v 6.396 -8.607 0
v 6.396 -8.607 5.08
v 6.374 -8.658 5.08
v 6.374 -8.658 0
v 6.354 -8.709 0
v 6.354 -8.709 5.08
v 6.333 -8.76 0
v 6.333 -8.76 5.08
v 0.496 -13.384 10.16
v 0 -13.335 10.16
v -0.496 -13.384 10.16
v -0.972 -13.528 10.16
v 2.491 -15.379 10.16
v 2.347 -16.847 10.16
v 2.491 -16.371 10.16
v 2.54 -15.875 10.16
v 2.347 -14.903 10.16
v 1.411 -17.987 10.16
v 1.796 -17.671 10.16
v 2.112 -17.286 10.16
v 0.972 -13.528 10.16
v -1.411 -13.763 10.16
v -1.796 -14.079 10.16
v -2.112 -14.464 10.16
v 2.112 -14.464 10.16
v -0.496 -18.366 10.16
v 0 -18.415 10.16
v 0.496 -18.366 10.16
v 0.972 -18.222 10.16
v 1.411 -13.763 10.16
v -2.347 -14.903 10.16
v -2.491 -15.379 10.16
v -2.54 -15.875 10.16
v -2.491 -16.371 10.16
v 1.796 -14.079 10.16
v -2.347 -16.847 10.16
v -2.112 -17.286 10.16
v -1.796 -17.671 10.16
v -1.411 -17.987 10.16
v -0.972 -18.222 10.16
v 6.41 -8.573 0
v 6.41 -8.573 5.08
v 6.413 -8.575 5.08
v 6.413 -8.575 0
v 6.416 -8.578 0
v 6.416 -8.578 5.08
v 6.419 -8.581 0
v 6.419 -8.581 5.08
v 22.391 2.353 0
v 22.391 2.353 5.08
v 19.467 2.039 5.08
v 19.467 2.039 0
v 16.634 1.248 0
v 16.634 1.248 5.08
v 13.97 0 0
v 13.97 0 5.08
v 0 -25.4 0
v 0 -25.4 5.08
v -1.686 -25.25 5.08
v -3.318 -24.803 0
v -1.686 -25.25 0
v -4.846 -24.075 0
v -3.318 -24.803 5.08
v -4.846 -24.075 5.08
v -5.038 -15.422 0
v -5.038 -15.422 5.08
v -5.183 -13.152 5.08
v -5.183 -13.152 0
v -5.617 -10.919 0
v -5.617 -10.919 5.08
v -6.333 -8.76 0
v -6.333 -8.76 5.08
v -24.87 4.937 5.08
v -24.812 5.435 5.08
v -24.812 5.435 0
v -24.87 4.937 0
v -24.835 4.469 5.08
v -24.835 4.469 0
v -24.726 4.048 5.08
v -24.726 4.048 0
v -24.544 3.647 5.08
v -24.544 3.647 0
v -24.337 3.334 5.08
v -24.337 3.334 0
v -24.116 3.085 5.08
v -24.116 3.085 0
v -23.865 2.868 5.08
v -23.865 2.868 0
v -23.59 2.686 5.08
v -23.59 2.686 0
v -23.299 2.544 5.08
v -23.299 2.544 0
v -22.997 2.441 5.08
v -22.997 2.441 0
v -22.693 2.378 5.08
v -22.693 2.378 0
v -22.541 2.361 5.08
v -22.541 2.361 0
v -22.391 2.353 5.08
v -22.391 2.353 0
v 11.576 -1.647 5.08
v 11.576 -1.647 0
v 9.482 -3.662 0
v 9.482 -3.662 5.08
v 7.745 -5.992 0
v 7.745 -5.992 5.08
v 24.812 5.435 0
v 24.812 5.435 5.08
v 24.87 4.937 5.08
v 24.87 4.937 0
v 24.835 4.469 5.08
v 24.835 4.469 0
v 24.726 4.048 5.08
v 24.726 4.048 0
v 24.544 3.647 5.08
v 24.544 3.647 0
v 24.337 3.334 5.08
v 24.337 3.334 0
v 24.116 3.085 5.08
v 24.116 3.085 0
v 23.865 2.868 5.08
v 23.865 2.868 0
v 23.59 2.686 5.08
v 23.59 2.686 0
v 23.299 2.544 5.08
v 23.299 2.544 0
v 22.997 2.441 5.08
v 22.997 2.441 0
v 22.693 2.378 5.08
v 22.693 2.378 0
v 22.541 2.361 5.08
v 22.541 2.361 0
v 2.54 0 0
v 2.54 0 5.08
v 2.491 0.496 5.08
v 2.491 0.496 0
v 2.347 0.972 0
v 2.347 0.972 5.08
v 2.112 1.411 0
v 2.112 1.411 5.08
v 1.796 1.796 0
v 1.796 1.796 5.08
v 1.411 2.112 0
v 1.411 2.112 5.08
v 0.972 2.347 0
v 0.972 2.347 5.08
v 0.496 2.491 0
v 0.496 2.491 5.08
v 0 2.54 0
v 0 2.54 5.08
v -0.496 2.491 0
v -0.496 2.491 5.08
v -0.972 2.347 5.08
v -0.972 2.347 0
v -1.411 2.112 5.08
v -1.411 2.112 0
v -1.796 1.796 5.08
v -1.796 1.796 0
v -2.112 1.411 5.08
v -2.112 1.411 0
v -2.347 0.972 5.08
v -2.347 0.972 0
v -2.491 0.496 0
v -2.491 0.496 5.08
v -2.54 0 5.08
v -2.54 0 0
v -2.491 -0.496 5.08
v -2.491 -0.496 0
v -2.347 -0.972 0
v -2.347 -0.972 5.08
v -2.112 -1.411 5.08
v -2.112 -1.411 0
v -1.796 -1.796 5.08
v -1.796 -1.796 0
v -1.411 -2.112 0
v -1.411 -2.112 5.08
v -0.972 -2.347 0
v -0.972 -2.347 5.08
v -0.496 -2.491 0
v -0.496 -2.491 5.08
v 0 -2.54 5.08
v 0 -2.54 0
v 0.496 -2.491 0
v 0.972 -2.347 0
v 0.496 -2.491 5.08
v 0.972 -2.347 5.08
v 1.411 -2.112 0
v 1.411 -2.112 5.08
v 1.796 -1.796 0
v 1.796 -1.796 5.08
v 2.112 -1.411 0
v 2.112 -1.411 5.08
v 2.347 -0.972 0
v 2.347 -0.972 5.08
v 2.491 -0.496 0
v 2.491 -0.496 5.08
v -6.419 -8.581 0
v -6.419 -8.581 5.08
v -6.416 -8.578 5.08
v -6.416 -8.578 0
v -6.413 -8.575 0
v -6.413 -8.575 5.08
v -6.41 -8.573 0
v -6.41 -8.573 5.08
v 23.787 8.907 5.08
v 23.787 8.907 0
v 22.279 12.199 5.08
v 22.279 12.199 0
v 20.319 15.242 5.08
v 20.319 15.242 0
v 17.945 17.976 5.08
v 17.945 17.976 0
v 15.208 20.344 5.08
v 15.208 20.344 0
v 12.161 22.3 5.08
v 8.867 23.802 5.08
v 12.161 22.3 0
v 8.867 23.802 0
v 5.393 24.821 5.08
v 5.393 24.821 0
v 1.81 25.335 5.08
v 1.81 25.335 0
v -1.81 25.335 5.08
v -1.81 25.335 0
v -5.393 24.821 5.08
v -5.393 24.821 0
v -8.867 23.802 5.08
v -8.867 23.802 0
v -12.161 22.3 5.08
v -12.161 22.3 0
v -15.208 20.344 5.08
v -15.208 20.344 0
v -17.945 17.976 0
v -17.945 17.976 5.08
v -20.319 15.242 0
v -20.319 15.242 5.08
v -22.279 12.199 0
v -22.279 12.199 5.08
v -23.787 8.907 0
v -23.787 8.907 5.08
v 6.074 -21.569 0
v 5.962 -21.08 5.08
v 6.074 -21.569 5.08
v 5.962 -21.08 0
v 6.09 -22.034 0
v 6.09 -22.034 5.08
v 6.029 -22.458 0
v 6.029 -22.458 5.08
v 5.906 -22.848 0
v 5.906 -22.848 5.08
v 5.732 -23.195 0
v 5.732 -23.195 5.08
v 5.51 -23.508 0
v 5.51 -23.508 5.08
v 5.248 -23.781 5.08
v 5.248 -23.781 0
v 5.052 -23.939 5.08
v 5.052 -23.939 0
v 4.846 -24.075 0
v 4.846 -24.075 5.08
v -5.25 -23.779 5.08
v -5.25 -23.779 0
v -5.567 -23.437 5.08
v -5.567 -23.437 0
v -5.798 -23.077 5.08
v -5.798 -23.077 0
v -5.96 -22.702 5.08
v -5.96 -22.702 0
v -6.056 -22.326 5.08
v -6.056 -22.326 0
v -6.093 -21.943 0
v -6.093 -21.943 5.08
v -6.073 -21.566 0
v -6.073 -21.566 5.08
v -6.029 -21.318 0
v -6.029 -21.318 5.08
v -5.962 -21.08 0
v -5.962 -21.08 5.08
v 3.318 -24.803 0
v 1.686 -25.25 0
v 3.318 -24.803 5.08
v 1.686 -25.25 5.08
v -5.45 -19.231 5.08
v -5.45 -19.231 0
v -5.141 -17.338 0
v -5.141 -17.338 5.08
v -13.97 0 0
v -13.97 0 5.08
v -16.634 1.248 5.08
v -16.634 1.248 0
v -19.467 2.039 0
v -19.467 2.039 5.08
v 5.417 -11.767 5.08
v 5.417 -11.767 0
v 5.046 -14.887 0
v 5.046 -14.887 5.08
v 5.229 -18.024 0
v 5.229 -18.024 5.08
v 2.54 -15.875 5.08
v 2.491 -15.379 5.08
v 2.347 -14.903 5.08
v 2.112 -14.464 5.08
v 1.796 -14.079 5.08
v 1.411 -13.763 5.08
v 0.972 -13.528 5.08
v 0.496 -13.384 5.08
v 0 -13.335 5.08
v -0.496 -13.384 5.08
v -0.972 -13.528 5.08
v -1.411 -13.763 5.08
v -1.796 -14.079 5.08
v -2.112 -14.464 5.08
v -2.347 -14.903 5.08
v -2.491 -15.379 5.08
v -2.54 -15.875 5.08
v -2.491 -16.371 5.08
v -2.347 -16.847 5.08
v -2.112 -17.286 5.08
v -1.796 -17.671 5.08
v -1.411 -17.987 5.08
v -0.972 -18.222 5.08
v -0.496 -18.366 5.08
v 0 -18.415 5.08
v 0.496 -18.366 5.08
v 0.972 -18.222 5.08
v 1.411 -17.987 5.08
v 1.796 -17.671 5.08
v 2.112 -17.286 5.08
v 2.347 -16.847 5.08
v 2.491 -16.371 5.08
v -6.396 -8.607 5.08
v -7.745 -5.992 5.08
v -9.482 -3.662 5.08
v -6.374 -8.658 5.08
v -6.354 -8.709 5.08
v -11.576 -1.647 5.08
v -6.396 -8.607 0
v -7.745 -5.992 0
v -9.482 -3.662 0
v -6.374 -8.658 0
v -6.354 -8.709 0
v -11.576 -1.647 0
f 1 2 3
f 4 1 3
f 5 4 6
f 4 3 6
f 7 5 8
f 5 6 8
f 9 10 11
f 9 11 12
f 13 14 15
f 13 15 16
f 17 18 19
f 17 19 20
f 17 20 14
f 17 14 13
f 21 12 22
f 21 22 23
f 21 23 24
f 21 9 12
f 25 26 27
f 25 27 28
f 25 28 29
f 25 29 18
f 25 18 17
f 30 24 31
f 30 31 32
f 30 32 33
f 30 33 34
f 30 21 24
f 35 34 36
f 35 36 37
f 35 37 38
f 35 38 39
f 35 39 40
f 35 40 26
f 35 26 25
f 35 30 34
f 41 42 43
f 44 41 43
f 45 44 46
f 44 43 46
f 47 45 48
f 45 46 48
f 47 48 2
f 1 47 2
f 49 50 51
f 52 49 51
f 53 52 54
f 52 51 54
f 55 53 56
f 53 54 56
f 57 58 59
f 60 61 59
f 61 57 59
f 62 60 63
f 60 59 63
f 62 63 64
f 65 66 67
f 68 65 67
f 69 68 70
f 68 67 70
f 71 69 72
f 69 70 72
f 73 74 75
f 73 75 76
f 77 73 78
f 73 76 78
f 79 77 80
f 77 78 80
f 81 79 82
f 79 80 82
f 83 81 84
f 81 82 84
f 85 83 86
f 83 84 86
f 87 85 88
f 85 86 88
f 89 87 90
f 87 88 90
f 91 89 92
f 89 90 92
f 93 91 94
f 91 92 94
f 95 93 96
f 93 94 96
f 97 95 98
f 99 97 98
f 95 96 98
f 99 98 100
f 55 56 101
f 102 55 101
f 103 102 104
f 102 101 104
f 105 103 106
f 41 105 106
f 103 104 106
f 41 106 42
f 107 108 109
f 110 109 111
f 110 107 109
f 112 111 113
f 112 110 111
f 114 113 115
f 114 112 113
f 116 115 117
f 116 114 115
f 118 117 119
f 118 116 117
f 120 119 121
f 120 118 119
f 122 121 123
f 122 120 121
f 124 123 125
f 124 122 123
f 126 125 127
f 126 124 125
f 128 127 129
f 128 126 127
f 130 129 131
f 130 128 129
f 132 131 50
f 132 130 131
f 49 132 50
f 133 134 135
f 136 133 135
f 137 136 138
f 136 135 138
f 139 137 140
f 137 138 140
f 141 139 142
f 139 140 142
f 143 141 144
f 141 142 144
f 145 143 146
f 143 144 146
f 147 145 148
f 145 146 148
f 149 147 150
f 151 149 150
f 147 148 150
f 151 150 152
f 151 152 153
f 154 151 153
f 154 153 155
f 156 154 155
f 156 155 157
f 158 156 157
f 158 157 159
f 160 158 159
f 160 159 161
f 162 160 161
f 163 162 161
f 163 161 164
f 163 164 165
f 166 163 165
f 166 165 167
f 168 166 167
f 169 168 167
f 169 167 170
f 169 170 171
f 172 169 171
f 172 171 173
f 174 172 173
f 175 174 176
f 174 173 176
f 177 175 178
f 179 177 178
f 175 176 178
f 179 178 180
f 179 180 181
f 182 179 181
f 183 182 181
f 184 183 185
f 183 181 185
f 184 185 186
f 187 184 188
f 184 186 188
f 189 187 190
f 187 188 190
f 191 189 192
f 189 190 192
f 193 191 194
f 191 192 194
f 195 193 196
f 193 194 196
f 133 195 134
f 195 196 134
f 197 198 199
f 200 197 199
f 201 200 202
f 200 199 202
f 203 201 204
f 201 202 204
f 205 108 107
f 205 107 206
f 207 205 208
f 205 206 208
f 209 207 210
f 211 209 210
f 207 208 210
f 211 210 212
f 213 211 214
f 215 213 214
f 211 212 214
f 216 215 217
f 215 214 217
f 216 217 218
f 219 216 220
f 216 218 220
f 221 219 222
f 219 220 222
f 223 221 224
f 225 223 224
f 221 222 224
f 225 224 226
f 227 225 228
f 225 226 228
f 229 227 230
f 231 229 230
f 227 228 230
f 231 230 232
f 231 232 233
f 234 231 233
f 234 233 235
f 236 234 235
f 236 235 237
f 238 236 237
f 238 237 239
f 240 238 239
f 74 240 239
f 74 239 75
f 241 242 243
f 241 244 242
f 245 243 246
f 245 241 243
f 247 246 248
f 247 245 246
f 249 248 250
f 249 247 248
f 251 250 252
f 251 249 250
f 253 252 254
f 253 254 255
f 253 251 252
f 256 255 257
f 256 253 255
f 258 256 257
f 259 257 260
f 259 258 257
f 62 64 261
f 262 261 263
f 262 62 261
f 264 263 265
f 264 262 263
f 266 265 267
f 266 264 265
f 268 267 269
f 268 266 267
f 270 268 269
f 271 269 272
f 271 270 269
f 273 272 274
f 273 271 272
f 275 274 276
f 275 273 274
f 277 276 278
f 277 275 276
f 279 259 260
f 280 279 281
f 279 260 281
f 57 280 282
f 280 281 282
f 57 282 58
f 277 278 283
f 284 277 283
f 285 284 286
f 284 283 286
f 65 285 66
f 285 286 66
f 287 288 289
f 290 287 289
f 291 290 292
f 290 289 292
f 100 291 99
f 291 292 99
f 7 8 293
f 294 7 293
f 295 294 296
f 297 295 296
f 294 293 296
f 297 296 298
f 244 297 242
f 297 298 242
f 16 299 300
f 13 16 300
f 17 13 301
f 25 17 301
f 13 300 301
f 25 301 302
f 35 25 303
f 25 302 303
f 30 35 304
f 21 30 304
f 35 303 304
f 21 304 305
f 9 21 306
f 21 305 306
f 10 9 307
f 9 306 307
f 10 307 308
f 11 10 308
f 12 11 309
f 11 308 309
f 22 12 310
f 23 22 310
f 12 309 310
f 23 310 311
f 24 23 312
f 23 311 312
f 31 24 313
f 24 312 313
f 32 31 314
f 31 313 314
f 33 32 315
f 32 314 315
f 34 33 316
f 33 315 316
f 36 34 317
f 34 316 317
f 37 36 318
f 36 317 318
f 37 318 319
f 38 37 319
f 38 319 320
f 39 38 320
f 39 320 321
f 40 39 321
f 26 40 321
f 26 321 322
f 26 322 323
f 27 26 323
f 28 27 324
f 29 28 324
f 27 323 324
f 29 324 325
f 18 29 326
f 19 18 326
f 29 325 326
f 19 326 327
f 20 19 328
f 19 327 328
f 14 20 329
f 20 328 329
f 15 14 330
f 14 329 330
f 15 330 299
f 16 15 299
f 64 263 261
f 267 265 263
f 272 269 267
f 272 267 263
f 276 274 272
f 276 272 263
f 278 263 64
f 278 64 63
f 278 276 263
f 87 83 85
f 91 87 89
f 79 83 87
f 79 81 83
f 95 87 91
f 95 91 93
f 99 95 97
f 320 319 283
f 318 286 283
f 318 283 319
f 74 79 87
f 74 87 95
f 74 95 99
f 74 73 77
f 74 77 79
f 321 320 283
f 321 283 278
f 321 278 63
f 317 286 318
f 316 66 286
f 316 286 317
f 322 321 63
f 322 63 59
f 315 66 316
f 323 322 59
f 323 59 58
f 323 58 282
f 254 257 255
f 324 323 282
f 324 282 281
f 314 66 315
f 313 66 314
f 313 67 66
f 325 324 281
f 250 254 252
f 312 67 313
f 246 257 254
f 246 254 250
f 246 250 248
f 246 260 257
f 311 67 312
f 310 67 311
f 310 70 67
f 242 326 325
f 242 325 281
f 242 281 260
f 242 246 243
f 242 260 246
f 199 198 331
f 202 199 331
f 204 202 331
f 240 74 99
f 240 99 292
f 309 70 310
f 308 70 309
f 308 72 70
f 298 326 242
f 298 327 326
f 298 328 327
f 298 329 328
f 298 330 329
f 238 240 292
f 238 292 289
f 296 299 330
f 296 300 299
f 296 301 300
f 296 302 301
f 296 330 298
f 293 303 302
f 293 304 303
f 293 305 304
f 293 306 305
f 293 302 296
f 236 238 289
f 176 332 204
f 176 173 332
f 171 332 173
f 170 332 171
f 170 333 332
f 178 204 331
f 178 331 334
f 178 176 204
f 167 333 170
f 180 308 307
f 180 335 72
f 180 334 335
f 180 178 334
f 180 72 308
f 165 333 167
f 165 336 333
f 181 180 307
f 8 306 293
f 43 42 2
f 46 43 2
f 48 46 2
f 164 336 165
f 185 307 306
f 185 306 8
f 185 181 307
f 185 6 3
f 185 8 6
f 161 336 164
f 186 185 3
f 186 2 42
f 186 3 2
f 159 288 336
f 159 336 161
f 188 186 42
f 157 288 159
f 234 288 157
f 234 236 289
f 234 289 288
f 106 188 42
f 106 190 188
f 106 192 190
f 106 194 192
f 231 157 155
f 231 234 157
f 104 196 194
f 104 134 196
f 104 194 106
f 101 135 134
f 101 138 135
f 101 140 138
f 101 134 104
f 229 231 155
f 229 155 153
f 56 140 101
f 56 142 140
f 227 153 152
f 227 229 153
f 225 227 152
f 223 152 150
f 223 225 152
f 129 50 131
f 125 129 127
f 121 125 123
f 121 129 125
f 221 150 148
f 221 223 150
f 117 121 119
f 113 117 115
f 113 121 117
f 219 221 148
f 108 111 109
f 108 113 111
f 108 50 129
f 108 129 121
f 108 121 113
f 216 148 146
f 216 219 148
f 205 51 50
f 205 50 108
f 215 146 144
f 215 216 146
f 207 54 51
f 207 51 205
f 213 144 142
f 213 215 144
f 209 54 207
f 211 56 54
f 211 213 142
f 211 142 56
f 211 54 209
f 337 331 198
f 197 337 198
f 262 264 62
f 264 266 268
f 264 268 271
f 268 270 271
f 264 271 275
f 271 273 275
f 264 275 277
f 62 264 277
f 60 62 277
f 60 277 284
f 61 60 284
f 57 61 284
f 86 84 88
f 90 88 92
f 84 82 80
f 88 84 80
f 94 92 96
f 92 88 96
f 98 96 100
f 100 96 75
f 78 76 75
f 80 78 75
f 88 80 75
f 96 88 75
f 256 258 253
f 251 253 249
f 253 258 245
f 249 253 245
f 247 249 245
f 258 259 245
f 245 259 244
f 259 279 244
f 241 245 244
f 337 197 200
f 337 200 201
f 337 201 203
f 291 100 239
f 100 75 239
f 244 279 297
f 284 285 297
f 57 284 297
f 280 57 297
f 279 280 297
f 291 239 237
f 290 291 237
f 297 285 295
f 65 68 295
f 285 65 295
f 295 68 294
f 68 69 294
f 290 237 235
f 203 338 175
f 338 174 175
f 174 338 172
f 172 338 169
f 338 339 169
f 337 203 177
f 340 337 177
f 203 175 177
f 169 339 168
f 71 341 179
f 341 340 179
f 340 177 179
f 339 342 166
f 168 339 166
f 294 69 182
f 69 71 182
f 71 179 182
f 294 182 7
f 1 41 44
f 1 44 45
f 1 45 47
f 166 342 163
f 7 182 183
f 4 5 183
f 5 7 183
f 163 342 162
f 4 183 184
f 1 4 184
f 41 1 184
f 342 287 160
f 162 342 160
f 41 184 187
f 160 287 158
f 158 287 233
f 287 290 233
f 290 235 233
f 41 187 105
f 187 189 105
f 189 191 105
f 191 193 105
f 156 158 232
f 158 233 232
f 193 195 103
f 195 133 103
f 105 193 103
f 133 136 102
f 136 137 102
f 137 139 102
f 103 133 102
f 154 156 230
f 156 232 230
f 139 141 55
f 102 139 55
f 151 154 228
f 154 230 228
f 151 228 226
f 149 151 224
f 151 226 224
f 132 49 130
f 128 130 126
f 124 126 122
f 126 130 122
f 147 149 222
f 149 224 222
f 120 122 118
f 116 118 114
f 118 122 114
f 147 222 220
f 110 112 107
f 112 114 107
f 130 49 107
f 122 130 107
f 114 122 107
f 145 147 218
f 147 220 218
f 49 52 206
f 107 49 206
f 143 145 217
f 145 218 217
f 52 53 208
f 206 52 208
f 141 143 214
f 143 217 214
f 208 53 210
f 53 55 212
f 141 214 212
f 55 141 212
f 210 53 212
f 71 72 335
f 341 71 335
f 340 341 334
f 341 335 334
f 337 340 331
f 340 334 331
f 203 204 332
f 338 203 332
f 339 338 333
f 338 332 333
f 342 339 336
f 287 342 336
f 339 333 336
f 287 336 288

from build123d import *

# Parameters (mm, degrees)
F0_R     = 25.4
F1_DEPTH = 5.08
F3_DEPTH = 25.4
F4_R     = 2.54
F5_R     = 2.54
F6_DEPTH = 25.4
F8_DEPTH = 5.08


with BuildPart() as f1:
    # F0 (on Top) → F1 (new body)
    with BuildSketch(Plane.XY):
        Circle(F0_R)
    extrude(amount=F1_DEPTH)

    # F2 (on face) → F3 (cut)
    with BuildSketch(Plane.XY.offset(5.08)):
        with BuildLine():
            ThreePointArc((-6.6100981471, -22.7330046286), (-9.5231262698, -15.6860792516), (-6.3329048366, -8.7602307605))
            ThreePointArc((-6.3329048366, -8.7602307605), (-6.3640275163, -8.6837329224), (-6.3955051853, -8.6073804713))
            Line((-6.3955051853, -8.6073804713), (-6.4190231614, -8.5806554984))
            ThreePointArc((-6.4190231614, -8.5806554984), (-18.6783561202, -10.4151947963), (-25.4, -3e-09))
            ThreePointArc((-25.4, -3e-09), (-20.4128361311, -15.1154265929), (-7.4097542481, -24.295175282))
            ThreePointArc((-7.4097542481, -24.295175282), (-6.9906405345, -23.523962051), (-6.6100981471, -22.7330046286))
        make_face()
        with BuildLine():
            Line((-13.97, 0), (-6.4190231614, -8.5806554984))
            ThreePointArc((-6.4190231614, -8.5806554984), (-6.4144876205, -8.5766620945), (-6.4099541915, -8.5726662931))
            ThreePointArc((-6.4099541915, -8.5726662931), (-9.482325957, -3.6622711754), (-13.97, 0))
        make_face()
        with BuildLine():
            ThreePointArc((-25.4, -3e-09), (-18.6783561202, -10.4151947963), (-6.4190231614, -8.5806554984))
            Line((-6.4190231614, -8.5806554984), (-13.97, 0))
            ThreePointArc((-13.97, 0), (-19.3966889497, 2.0254618044), (-25.1864455812, 2.1991472264))
            ThreePointArc((-25.1864455812, 2.1991472264), (-25.3464861227, 1.1047458984), (-25.4, -3e-09))
        make_face()
        with BuildLine():
            ThreePointArc((-5.0375846352, -15.4223424331), (-5.3644186356, -12.0289080974), (-6.3329048366, -8.7602307605))
            ThreePointArc((-6.3329048366, -8.7602307605), (-9.5231262698, -15.6860792516), (-6.6100981471, -22.7330046286))
            ThreePointArc((-6.6100981471, -22.7330046286), (-5.4351580244, -19.1612787953), (-5.0375846352, -15.4223424331))
        make_face()
        with BuildLine():
            ThreePointArc((-7.4097542481, -24.295175282), (-3.7458341923, -25.1222754981), (3.3e-08, -25.4))
            ThreePointArc((3.3e-08, -25.4), (-3.3627869226, -24.7866378468), (-6.2924806988, -23.0255462487))
            Line((-6.2924806988, -23.0255462487), (-7.4097542481, -24.295175282))
        make_face()
        with BuildLine():
            Line((7.4097542481, -24.295175282), (6.2924806988, -23.0255462487))
            ThreePointArc((6.2924806988, -23.0255462487), (3.3627869535, -24.7866378352), (3.3e-08, -25.4))
            ThreePointArc((3.3e-08, -25.4), (3.745834225, -25.1222754933), (7.4097542481, -24.295175282))
        make_face()
        with BuildLine():
            ThreePointArc((6.3329048366, -8.7602307605), (8.690412636, -11.9759804802), (9.525, -15.875))
            ThreePointArc((9.525, -15.875), (8.7660370137, -19.6008851398), (6.6100981471, -22.7330046286))
            ThreePointArc((6.6100981471, -22.7330046286), (6.9906405345, -23.523962051), (7.4097542481, -24.295175282))
            ThreePointArc((7.4097542481, -24.295175282), (20.412836132, -15.1154265917), (25.4, 0))
            ThreePointArc((25.4, 0), (18.6783561215, -10.4151947957), (6.4190231614, -8.5806554984))
            Line((6.4190231614, -8.5806554984), (6.3955051853, -8.6073804713))
            ThreePointArc((6.3955051853, -8.6073804713), (6.3640275163, -8.6837329224), (6.3329048366, -8.7602307605))
        make_face()
        with BuildLine():
            Line((13.97, 0), (6.4190231614, -8.5806554984))
            ThreePointArc((6.4190231614, -8.5806554984), (18.6783561215, -10.4151947957), (25.4, 0))
            ThreePointArc((25.4, 0), (25.3464861226, 1.1047458999), (25.1864455812, 2.1991472264))
            ThreePointArc((25.1864455812, 2.1991472264), (19.3966889497, 2.0254618044), (13.97, 0))
        make_face()
        with BuildLine():
            ThreePointArc((6.6100981471, -22.7330046286), (8.7660370137, -19.6008851398), (9.525, -15.875))
            ThreePointArc((9.525, -15.875), (8.690412636, -11.9759804802), (6.3329048366, -8.7602307605))
            ThreePointArc((6.3329048366, -8.7602307605), (5.0410822649, -15.7749944968), (6.6100981471, -22.7330046286))
        make_face()
        with BuildLine():
            ThreePointArc((6.4099541915, -8.5726662931), (6.4144876205, -8.5766620945), (6.4190231614, -8.5806554984))
            Line((6.4190231614, -8.5806554984), (13.97, 0))
            ThreePointArc((13.97, 0), (9.482325957, -3.6622711754), (6.4099541915, -8.5726662931))
        make_face()
        with BuildLine():
            Line((-7.4097542481, -24.295175282), (-6.2924806988, -23.0255462487))
            ThreePointArc((-6.2924806988, -23.0255462487), (-6.4529474172, -22.8810755514), (-6.6100981471, -22.7330046286))
            ThreePointArc((-6.6100981471, -22.7330046286), (-6.9906405345, -23.523962051), (-7.4097542481, -24.295175282))
        make_face()
        with BuildLine():
            ThreePointArc((7.4097542481, -24.295175282), (6.9906405345, -23.523962051), (6.6100981471, -22.7330046286))
            ThreePointArc((6.6100981471, -22.7330046286), (6.4529474172, -22.8810755514), (6.2924806988, -23.0255462487))
            Line((6.2924806988, -23.0255462487), (7.4097542481, -24.295175282))
        make_face()
        with BuildLine():
            ThreePointArc((-25.1864455812, 2.1991472264), (-25.2462602872, 2.1910029214), (-25.306046997, 2.1826555809))
            ThreePointArc((-25.306046997, 2.1826555809), (-25.3765008791, 1.0923383792), (-25.4, -3e-09))
            ThreePointArc((-25.4, -3e-09), (-25.3464861227, 1.1047458984), (-25.1864455812, 2.1991472264))
        make_face()
        with BuildLine():
            ThreePointArc((25.1864455812, 2.1991472264), (25.3464861226, 1.1047458999), (25.4, 0))
            ThreePointArc((25.4, 0), (25.376500879, 1.0923383807), (25.306046997, 2.1826555809))
            ThreePointArc((25.306046997, 2.1826555809), (25.2462602872, 2.1910029214), (25.1864455812, 2.1991472264))
        make_face()
    extrude(amount=-F3_DEPTH, mode=Mode.SUBTRACT)

    # F4
    f4_edges = [f1.edges().sort_by_distance(p)[0] for p in [
        (-25.306047, 2.182656, 2.54),
        (-6.610098, -22.733005, 2.54),
        (6.610098, -22.733005, 2.54),
        (25.306047, 2.182656, 2.54),
    ]]
    fillet(f4_edges, radius=F4_R)

    # F5 (on face) → F6 (cut)
    with BuildSketch(Plane.XY.offset(5.08)):
        Circle(F5_R)
    extrude(amount=-F6_DEPTH, mode=Mode.SUBTRACT)

    # F7 (on face) → F8 (join)
    with BuildSketch(Plane.XY.offset(5.08)):
        with BuildLine():
            ThreePointArc((0, -13.335), (-1.7960512242, -17.6710512242), (2.54, -15.875))
            ThreePointArc((2.54, -15.875), (1.7960512242, -14.0789487758), (0, -13.335))
        make_face()
    extrude(amount=F8_DEPTH)


solid = f1.part
